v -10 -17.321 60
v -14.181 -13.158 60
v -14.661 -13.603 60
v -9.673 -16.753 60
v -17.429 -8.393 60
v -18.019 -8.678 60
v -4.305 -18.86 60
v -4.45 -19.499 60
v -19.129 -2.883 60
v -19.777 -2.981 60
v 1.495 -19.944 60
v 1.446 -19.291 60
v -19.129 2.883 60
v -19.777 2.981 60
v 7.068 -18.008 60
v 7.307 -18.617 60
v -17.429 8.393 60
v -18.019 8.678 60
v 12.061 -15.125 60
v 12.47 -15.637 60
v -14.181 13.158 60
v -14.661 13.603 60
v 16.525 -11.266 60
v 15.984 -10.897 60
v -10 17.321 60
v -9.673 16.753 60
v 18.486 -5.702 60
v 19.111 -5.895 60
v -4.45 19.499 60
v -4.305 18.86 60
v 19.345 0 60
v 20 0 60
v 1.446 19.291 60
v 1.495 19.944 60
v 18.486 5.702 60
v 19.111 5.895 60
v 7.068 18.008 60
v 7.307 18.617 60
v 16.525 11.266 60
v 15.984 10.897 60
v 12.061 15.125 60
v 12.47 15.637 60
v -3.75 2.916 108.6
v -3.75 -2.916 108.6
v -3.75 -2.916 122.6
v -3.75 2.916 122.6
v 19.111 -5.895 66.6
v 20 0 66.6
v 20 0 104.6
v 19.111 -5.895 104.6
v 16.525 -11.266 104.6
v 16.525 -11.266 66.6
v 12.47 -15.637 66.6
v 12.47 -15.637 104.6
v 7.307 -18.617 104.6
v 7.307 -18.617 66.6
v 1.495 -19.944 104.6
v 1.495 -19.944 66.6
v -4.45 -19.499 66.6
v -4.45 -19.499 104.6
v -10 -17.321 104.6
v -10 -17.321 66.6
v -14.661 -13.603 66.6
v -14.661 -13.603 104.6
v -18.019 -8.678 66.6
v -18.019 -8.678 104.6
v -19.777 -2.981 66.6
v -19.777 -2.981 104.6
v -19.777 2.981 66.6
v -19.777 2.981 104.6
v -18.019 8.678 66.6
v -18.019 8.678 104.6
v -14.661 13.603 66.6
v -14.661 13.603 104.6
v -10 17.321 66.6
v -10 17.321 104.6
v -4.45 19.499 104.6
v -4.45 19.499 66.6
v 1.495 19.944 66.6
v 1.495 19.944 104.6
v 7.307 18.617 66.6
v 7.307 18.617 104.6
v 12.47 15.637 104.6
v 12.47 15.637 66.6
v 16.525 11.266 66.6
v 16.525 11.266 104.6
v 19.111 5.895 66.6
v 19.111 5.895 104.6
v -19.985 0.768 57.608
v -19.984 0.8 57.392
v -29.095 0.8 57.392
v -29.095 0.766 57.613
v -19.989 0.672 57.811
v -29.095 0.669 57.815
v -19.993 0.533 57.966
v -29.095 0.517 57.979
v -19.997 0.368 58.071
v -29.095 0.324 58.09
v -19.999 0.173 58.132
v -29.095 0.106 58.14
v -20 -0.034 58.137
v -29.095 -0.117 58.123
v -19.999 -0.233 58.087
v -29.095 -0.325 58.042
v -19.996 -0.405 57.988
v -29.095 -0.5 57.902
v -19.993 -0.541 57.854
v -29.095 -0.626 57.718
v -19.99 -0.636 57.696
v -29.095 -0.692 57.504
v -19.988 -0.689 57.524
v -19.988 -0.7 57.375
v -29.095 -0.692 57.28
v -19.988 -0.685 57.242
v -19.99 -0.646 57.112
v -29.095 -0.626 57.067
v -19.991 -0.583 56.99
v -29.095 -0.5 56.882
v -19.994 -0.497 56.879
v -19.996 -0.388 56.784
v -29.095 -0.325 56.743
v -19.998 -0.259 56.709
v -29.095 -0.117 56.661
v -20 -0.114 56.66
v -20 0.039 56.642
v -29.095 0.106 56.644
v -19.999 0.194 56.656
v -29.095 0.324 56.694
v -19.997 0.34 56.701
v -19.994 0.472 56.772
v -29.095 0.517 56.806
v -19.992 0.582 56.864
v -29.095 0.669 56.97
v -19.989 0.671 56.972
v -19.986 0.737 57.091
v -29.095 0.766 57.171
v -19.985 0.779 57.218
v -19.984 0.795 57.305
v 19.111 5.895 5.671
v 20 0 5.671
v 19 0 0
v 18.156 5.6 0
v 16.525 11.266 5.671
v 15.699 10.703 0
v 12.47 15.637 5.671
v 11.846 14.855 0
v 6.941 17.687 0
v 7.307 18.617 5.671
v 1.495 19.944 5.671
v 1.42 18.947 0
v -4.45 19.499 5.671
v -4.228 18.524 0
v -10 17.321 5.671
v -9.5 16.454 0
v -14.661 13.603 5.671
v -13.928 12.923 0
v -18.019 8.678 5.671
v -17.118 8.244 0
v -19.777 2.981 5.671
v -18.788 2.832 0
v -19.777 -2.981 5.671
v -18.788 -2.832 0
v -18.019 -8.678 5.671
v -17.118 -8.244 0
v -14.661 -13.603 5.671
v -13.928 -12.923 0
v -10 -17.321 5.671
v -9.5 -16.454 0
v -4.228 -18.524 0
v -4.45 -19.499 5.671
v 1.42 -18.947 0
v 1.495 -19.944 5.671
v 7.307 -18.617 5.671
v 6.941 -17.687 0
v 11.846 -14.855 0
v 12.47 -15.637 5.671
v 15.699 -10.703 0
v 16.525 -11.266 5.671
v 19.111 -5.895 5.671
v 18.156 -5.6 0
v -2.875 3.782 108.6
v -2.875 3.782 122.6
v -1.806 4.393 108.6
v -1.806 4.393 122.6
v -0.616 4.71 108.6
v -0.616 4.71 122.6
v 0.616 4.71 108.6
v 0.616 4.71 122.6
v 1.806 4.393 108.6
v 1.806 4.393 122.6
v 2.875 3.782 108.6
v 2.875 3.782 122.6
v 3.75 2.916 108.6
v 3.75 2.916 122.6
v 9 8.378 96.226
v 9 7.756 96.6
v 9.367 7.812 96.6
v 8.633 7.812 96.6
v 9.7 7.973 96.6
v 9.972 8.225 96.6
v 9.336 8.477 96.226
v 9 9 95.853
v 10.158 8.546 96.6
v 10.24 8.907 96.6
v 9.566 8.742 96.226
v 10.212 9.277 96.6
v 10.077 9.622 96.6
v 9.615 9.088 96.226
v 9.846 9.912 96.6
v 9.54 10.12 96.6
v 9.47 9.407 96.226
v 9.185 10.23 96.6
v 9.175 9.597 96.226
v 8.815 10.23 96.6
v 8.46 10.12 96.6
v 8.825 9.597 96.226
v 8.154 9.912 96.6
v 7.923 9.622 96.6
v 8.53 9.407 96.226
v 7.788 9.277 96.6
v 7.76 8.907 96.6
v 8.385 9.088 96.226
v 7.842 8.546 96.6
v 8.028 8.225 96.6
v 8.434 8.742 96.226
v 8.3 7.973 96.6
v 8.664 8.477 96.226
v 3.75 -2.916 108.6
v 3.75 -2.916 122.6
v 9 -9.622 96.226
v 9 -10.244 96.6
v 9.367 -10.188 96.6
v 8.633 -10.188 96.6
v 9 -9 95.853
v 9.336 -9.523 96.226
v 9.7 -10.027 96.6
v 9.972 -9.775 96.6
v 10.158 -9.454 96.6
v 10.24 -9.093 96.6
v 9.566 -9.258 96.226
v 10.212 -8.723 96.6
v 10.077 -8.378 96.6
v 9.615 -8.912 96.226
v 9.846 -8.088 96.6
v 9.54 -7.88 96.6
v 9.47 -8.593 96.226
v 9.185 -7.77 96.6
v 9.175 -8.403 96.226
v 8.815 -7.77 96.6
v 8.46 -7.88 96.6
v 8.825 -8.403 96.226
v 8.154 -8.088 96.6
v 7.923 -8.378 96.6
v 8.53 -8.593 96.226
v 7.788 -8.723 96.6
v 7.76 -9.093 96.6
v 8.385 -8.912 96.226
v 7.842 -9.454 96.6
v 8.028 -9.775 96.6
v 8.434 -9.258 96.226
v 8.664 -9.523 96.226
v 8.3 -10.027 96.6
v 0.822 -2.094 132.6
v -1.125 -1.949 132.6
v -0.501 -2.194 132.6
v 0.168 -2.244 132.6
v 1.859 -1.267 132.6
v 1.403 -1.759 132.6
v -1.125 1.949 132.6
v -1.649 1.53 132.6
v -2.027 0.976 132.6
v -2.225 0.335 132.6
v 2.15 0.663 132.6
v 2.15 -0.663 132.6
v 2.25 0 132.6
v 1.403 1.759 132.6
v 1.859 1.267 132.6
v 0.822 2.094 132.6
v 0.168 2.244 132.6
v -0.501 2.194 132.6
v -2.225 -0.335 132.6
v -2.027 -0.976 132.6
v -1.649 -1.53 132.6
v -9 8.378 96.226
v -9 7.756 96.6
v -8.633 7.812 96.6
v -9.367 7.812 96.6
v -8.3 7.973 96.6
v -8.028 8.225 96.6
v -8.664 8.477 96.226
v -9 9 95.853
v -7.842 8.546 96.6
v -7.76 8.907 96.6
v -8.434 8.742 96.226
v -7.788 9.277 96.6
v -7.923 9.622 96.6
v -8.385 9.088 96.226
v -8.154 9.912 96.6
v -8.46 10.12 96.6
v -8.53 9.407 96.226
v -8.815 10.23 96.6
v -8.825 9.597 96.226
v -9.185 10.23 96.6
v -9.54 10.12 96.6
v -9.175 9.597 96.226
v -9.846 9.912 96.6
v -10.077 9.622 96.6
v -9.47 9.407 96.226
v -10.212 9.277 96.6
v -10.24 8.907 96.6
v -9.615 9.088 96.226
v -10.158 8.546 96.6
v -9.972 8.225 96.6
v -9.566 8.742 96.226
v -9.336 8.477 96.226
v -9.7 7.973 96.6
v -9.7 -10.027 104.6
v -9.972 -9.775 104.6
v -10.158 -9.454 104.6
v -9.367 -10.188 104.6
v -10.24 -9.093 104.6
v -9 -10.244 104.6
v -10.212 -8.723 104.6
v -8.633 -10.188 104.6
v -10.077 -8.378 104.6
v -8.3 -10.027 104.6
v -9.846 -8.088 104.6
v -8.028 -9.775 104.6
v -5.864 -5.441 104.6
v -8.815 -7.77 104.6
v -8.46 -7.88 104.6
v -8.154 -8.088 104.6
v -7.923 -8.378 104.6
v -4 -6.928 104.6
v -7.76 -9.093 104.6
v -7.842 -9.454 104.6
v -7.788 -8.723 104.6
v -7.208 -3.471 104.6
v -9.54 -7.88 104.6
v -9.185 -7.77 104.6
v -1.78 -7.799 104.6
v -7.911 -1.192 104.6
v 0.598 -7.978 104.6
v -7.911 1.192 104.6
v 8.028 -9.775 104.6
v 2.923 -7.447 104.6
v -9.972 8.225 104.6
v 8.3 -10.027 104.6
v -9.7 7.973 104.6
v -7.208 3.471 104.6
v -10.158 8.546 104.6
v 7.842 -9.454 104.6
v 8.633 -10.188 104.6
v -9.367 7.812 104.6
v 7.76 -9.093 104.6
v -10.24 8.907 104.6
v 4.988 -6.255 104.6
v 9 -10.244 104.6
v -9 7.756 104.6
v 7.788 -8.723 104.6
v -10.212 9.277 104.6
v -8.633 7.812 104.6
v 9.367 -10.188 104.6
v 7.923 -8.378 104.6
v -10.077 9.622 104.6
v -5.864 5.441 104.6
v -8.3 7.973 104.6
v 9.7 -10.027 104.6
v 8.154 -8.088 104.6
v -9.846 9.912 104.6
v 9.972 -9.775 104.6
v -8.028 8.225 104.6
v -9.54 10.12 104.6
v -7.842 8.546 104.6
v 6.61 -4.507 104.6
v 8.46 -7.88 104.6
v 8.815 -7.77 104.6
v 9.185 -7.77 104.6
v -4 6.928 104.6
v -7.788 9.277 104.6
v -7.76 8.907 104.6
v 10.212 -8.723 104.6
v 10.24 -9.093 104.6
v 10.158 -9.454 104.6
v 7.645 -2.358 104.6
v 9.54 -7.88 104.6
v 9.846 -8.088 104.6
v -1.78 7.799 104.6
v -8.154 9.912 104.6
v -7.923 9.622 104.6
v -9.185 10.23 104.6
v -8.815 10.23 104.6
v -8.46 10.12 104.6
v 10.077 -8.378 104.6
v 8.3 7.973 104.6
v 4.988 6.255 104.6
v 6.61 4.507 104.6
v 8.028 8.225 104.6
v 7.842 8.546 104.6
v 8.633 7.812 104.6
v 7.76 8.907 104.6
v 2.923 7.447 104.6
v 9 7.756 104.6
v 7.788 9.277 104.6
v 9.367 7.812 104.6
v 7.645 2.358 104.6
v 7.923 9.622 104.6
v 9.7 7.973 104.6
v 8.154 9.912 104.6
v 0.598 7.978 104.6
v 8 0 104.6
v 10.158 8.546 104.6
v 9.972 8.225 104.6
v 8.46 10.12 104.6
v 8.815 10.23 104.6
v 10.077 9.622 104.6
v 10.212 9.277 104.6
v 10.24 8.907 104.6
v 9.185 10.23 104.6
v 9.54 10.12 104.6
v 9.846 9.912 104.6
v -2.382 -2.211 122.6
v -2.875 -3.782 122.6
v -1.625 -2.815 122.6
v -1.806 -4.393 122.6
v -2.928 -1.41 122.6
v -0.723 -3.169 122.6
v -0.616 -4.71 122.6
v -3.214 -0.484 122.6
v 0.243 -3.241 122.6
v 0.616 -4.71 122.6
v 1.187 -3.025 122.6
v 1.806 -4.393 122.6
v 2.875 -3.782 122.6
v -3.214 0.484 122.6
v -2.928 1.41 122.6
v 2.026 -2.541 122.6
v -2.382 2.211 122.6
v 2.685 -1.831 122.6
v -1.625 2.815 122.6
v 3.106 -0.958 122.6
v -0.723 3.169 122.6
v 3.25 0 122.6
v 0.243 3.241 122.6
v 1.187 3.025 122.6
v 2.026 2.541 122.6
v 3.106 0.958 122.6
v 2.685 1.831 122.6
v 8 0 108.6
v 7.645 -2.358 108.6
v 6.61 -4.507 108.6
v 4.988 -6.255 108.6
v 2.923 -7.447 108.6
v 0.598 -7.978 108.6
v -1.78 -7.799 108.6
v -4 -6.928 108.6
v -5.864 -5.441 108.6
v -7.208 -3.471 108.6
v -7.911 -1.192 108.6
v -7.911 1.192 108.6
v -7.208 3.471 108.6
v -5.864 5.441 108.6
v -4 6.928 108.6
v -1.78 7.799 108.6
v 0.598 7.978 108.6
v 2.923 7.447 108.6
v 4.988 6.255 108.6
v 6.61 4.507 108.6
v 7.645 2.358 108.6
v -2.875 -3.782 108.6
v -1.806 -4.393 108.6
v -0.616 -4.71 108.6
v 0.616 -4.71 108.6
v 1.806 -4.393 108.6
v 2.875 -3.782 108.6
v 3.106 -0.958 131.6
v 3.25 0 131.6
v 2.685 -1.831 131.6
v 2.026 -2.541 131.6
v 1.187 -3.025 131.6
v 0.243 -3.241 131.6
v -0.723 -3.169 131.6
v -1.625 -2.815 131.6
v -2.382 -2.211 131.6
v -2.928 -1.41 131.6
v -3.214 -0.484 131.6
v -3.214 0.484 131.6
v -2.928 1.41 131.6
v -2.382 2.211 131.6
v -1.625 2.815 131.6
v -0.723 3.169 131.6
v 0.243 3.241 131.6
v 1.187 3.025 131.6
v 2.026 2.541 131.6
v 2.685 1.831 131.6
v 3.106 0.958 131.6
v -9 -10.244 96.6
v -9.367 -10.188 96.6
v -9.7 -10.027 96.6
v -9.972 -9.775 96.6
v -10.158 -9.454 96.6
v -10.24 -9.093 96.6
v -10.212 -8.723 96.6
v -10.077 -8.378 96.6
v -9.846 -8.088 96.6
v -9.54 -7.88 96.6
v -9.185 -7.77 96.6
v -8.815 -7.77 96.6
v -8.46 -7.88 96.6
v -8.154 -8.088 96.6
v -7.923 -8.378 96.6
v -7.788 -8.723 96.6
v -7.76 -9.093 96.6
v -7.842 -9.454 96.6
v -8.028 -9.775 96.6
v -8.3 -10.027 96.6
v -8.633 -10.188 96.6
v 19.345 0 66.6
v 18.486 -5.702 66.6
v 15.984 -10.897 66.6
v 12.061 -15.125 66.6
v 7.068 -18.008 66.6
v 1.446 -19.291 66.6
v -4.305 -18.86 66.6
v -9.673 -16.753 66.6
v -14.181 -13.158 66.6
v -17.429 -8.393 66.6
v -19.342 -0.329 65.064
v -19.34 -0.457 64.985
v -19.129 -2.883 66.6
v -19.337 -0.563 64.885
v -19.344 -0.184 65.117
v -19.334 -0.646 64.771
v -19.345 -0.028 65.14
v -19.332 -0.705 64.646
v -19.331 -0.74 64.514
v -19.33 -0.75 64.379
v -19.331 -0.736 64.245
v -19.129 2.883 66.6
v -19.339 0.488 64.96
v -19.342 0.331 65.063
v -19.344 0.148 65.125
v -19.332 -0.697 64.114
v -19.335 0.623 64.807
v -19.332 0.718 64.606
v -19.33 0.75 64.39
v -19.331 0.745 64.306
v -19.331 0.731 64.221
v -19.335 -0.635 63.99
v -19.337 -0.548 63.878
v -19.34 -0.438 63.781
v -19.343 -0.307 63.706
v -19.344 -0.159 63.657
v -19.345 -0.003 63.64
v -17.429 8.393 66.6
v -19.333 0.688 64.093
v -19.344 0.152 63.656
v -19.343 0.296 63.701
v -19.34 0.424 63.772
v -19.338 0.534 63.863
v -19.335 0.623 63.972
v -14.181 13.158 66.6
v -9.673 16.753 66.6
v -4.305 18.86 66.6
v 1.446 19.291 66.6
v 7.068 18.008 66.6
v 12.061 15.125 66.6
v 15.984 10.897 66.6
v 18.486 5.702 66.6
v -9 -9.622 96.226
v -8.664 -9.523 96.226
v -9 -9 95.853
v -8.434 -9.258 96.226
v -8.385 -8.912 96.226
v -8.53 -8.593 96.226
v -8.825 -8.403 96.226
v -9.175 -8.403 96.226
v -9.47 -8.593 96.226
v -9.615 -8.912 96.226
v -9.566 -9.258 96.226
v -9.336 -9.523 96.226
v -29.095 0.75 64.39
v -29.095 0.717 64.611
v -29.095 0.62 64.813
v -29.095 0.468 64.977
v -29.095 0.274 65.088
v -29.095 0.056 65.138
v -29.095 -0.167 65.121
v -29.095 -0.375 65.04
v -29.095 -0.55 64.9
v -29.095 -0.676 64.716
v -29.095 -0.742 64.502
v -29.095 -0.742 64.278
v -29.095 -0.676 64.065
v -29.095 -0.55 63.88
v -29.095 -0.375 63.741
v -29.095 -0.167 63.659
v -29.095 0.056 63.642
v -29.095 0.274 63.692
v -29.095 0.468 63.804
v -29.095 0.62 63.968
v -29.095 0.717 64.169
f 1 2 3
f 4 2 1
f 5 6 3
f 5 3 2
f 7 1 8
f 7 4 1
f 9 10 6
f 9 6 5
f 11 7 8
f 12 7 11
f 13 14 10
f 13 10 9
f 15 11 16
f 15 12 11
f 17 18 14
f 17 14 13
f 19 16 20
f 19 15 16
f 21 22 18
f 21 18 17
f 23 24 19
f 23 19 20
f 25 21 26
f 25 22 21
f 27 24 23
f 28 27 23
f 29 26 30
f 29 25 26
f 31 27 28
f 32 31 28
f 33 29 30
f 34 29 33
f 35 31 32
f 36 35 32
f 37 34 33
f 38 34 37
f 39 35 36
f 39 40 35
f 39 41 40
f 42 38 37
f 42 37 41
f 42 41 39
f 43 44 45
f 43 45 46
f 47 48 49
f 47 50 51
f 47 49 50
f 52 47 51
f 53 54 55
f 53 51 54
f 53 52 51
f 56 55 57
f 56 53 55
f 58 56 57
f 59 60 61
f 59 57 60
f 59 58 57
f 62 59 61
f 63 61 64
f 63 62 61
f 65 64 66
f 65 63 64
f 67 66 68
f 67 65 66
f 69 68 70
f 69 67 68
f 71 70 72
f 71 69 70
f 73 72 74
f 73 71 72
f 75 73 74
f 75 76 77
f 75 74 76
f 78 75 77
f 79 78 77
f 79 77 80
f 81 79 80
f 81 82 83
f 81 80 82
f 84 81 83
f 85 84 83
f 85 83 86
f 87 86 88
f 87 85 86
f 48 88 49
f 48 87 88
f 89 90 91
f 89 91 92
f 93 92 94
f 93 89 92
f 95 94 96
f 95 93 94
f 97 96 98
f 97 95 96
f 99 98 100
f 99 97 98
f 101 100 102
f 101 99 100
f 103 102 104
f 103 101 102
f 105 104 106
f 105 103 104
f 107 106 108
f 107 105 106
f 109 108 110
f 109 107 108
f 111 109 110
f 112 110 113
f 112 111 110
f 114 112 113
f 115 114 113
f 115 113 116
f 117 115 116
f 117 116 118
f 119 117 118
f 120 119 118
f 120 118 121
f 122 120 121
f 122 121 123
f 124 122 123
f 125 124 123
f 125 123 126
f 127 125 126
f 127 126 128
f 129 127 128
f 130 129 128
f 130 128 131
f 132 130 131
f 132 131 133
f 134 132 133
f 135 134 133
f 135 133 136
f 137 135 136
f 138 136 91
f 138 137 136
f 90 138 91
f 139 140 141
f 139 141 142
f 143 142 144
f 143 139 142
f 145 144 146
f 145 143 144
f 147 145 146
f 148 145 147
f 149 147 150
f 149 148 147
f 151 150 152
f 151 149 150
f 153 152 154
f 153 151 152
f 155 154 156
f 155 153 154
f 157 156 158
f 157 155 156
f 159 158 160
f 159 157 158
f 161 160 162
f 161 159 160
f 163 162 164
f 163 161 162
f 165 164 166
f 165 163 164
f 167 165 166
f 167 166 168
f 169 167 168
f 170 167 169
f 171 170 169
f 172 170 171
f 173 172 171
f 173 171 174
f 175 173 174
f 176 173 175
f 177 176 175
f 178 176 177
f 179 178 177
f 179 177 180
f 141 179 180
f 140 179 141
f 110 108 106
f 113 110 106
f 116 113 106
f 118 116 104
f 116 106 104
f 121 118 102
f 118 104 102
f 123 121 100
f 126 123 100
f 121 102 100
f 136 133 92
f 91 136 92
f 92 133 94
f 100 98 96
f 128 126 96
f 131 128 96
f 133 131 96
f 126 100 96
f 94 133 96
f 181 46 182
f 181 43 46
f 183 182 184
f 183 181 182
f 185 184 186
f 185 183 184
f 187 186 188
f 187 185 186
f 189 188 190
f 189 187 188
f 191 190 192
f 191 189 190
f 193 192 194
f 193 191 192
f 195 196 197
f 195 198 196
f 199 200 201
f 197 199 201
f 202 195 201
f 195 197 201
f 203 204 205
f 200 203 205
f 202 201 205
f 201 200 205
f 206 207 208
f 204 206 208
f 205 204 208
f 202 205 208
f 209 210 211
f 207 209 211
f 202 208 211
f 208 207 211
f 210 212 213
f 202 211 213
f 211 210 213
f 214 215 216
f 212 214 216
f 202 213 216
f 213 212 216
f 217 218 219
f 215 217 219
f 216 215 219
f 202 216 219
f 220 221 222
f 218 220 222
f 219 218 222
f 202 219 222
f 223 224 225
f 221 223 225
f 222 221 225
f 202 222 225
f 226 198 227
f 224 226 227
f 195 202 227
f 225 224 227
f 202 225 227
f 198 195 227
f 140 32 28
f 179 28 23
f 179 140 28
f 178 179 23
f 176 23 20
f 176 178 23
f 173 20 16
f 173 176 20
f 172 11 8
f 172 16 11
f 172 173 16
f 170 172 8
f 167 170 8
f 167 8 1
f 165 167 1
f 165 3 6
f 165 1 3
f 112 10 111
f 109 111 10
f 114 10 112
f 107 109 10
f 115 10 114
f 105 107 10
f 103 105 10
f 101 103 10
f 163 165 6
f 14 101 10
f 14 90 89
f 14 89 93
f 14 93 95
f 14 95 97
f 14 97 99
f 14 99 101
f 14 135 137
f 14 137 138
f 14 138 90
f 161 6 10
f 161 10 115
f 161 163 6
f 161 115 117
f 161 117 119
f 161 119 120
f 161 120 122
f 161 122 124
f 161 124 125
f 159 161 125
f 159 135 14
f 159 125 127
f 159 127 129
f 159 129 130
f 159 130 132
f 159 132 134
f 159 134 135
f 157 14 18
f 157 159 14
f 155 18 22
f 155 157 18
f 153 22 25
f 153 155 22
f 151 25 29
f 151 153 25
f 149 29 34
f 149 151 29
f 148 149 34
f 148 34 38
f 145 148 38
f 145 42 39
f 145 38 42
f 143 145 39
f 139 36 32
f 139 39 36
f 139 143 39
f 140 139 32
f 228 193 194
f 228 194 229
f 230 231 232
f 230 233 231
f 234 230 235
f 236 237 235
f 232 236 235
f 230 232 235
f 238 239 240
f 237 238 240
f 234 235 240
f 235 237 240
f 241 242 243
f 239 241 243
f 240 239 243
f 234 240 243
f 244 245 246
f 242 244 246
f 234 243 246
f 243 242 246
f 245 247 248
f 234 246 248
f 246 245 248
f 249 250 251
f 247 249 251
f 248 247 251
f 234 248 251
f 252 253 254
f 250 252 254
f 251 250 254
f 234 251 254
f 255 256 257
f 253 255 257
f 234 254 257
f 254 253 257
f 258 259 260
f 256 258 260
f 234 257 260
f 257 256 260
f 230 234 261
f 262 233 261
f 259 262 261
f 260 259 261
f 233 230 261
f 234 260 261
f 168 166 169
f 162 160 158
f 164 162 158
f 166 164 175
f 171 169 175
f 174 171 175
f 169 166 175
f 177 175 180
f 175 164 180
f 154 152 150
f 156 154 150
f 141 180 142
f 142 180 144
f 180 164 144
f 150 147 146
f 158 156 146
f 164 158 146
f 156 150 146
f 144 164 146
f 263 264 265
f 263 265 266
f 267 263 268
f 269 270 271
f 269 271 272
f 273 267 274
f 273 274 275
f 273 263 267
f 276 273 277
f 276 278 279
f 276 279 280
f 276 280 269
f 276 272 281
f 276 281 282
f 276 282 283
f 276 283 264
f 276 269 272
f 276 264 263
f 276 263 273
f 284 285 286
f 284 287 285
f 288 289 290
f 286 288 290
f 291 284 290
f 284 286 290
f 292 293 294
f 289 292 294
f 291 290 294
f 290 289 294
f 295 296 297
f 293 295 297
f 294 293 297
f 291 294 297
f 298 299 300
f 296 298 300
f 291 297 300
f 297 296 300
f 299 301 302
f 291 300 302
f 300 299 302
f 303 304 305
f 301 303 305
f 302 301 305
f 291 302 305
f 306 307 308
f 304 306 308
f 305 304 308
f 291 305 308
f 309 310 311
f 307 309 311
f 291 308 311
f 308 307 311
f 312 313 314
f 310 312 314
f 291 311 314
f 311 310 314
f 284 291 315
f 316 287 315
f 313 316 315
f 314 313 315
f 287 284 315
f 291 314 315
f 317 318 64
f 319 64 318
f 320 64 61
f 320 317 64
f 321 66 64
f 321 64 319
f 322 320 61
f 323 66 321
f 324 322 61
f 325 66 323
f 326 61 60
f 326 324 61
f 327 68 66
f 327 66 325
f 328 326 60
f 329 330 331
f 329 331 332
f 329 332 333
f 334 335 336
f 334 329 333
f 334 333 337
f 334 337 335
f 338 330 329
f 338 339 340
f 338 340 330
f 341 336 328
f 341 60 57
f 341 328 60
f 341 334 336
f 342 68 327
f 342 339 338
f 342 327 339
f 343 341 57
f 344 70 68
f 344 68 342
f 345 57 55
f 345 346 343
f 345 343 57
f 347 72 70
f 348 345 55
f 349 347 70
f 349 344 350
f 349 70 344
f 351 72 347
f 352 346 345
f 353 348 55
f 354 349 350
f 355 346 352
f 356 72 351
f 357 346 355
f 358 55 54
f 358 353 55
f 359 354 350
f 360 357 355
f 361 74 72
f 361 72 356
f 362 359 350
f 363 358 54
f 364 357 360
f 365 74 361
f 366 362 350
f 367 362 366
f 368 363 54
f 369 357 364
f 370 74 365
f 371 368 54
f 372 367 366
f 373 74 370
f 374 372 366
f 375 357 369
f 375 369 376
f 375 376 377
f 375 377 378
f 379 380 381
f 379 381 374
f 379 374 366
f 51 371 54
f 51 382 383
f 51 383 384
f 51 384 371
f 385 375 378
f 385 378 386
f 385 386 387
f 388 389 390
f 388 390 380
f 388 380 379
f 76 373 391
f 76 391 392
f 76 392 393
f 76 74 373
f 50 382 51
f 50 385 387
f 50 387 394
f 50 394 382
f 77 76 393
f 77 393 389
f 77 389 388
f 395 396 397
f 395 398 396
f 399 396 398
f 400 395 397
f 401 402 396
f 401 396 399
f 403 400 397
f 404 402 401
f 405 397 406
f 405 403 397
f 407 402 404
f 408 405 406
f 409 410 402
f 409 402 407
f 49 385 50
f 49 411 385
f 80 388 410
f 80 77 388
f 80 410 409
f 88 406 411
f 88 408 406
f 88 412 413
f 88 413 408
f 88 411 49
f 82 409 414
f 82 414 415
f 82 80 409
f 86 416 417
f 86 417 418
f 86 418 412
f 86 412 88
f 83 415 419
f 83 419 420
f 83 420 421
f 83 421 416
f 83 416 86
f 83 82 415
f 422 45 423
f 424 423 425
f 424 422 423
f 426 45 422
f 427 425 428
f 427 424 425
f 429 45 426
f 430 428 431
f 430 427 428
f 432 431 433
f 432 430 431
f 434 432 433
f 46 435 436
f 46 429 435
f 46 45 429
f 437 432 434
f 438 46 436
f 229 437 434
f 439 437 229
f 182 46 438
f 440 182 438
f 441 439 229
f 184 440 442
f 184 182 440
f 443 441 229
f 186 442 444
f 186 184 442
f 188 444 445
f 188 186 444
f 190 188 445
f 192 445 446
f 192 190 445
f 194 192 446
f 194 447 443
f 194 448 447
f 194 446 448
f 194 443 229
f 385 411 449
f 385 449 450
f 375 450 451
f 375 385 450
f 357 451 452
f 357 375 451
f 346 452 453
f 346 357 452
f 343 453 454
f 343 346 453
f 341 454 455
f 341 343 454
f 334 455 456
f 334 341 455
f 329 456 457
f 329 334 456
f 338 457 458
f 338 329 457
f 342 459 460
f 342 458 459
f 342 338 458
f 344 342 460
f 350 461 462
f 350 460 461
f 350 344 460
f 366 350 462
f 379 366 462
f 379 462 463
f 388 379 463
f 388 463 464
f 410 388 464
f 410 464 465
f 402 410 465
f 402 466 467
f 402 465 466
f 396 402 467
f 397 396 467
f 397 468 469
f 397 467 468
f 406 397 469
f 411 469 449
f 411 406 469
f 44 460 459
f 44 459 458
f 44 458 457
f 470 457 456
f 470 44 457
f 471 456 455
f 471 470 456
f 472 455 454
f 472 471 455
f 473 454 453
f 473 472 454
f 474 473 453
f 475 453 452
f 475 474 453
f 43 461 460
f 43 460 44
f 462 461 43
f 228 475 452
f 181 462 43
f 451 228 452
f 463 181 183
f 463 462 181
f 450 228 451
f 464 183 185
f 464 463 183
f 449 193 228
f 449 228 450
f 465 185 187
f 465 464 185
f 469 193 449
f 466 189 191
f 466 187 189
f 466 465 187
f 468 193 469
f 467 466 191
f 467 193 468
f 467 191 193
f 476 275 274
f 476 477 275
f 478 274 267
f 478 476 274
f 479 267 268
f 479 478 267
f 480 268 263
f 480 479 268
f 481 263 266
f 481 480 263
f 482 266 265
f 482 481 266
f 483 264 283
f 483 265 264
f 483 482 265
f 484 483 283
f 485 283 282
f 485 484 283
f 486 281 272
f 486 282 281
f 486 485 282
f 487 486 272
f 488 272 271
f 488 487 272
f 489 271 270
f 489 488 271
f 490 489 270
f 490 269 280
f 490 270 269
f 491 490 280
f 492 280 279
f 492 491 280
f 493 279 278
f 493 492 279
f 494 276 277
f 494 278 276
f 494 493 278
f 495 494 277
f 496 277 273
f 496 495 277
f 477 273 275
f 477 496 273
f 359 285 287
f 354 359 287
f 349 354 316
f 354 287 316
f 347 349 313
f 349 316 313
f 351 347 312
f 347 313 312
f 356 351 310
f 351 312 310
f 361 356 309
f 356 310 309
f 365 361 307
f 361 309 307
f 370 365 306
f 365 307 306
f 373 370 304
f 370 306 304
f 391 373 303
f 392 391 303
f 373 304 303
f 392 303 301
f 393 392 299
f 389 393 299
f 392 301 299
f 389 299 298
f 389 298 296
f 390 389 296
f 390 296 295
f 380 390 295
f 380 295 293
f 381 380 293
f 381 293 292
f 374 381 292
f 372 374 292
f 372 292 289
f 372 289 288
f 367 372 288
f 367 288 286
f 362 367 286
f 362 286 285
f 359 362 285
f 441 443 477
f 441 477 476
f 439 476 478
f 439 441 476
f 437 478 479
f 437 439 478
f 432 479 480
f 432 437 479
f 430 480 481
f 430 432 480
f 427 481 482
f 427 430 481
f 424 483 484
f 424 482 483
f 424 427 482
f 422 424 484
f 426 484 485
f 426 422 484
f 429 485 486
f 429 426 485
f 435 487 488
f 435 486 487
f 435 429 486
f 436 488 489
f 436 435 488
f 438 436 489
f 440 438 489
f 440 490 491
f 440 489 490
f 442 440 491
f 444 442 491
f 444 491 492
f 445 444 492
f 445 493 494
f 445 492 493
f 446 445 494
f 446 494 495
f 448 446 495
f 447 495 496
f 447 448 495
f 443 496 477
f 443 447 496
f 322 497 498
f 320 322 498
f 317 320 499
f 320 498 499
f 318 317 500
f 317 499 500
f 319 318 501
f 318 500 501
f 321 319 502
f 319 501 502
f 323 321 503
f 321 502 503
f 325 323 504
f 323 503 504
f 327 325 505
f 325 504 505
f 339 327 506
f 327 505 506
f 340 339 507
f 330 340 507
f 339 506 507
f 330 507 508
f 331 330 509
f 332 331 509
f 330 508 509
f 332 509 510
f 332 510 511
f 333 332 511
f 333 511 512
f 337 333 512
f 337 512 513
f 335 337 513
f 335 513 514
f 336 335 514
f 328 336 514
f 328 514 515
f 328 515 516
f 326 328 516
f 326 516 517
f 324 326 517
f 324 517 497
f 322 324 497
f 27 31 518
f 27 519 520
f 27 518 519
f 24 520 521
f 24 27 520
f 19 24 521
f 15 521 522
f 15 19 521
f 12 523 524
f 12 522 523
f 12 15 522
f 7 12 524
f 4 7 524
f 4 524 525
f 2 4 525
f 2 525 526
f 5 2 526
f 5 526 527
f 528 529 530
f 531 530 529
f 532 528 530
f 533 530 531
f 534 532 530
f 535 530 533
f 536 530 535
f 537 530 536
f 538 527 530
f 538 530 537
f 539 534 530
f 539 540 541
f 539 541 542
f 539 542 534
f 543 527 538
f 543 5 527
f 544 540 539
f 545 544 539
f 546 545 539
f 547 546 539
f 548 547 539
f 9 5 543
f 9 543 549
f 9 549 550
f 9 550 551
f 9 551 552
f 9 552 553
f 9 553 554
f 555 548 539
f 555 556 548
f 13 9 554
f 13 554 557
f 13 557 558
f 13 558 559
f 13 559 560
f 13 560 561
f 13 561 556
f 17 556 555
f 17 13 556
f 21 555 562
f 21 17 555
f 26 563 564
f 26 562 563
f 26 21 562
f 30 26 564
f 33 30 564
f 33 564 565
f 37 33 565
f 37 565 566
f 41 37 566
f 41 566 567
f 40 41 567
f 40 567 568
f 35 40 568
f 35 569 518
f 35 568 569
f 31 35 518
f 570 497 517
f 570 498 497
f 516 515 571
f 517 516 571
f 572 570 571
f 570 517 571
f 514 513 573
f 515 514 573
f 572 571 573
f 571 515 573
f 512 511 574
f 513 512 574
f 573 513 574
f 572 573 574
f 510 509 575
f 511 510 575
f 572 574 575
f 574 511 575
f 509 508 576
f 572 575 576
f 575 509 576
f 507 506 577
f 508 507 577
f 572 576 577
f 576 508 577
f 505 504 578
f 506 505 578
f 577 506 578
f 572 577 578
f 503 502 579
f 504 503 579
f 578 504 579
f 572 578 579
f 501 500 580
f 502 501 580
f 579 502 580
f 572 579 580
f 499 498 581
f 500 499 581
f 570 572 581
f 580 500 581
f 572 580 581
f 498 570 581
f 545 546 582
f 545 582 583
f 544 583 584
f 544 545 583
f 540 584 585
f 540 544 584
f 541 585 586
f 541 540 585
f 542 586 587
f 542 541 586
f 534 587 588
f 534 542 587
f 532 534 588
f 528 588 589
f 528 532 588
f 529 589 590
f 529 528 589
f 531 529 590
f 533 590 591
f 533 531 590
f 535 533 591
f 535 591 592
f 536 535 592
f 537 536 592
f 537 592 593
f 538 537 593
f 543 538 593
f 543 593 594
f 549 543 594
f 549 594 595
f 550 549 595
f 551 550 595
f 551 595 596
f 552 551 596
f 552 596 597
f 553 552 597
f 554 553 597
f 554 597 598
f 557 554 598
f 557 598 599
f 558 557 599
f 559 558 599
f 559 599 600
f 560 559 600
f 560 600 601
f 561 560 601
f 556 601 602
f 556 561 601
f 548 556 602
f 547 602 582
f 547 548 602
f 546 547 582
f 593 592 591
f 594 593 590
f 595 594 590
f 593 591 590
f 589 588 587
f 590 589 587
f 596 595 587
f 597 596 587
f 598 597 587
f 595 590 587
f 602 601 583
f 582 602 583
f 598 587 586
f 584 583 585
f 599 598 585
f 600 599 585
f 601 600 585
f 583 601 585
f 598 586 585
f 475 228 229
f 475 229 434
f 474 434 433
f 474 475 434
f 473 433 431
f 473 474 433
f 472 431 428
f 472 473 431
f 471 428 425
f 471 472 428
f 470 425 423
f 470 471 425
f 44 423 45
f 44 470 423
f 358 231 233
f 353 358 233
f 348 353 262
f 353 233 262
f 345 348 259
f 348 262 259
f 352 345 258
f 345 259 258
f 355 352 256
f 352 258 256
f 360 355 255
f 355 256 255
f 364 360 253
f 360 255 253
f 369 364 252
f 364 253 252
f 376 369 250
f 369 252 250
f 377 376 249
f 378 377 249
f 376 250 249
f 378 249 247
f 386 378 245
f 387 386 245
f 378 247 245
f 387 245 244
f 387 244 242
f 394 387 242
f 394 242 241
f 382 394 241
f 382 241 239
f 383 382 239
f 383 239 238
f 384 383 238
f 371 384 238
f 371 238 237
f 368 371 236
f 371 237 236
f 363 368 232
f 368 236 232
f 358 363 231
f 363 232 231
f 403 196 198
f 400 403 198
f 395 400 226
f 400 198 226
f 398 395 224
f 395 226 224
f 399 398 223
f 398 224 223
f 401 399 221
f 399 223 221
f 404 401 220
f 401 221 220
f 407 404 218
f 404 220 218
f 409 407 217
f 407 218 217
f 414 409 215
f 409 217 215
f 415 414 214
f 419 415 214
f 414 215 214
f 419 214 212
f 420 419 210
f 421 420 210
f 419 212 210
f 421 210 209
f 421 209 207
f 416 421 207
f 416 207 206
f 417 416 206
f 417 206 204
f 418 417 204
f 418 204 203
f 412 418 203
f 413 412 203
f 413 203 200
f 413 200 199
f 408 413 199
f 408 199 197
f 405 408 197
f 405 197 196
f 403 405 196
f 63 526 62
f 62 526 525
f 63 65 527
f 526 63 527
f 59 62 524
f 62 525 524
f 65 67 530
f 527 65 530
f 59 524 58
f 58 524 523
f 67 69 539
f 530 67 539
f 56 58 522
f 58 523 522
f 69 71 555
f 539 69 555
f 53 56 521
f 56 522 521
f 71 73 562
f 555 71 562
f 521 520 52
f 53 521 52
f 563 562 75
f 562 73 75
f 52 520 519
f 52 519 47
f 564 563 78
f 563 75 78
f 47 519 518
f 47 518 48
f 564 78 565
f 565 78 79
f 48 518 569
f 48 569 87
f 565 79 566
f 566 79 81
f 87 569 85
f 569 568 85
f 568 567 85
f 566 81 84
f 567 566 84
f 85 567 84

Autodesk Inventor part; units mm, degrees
ref_plane "YZ Plane" through (0, 0, 0) normal (1, 0, 0) x (0, 1, 0)
sketch "Sketch1" plane through (0, 0, 0) normal (0, 0, 1) x (1, 0, 0)
  circle A0 centre (0, 0) radius 20
  dimension "d0" = 40
extrude "Extrusion1" add sketch "Sketch1" along normal blind 60
sketch "Sketch2" plane through (0, 0, 60) normal (0, 0, 1) x (1, 0, 0)
  circle A0 centre (0, 0) radius 20 projected
  circle A1 centre (0, 0) radius 19.345
extrude "Extrusion2" add sketch "Sketch2" along normal blind 6.6 contours A1
sketch "Sketch3" plane through (0, 0, 66.6) normal (0, 0, 1) x (1, 0, 0)
  circle A0 centre (0, 0) radius 19.345 projected
  circle A1 centre (0, 0) radius 20
  dimension "d5" = 40
extrude "Extrusion3" add sketch "Sketch3" along normal blind 38 contours A0 | A1
sketch "Sketch4" plane through (0, 0, 104.6) normal (0, 0, 1) x (1, 0, 0)
  circle A0 centre (0, 0) radius 20 projected
  circle A1 centre (0, 0) radius 8
  dimension "d8" = 16
extrude "Extrusion4" add sketch "Sketch4" along normal blind 4 contours A1
sketch "Sketch5" plane through (0, 0, 108.6) normal (0, 0, 1) x (1, 0, 0)
  circle A0 centre (0, 0) radius 8 projected
  line L0 (3.75, 2.9155) -> (3.75, -2.9155)
  line L1 (-3.75, -2.9155) -> (-3.75, 2.9155)
  arc A1 (-3.75, -2.9155) -> (3.75, -2.9155) centre (0, 0) ccw
  arc A2 (3.75, 2.9155) -> (-3.75, 2.9155) centre (0, 0) ccw
  point P0 (-3.75, 0)
  point P1 (0, 5.9024)
  dimension "d13" = 4.75
  dimension "d14" = 4.75
  dimension "d15" = 7.5
  dimension "d16" = 3.75
  dimension "d17" = 7.5
  dimension "d18" = 5.9024
extrude "Extrusion5" add sketch "Sketch5" along normal blind 14 contours L0 A1 L1 A2
sketch "Sketch6" plane through (0, 0, 122.6) normal (0, 0, 1) x (1, 0, 0)
  line L0 (3.75, 2.9155) -> (3.75, -2.9155) projected
  arc A0 (3.75, 2.9155) -> (-3.75, 2.9155) centre (0, 0) ccw projected
  line L1 (-3.75, -2.9155) -> (-3.75, 2.9155) projected
  arc A1 (-3.75, -2.9155) -> (3.75, -2.9155) centre (0, 0) ccw projected
  circle A2 centre (0, 0) radius 3.25
  dimension "d21" = 6.5
extrude "Extrusion6" add sketch "Sketch6" along normal blind 10 contours A2
chamfer "Chamfer1" distance 1 angle 45 1 edges at (-3.25, 0, 132.6)
chamfer "Chamfer2" distance 1 angle 80 1 edges at (-20, 0, 0) measured on face at (-2.364, 6.2334, 0)
ref_plane "Work Plane1" through (-19.345, 0, 60) normal (1, 0, 0) x (0, 1, 0)
ref_plane "Work Plane2" through (-19.095, 0, 60) normal (1, 0, 0) x (0, 1, 0)
sketch "Sketch8" plane through (-19.095, 0, 60) normal (1, 0, 0) x (0, 1, 0)
  circle A0 centre (0.0498, -2.6078) radius 0.75
  circle A1 centre (0, 4.3902) radius 0.75
  dimension "d31" = 1.5
  dimension "d32" = 1.5
extrude "Extrusion7" add sketch "Sketch8" against normal blind 10
sketch "Sketch9" plane through (0, 0, 104.6) normal (0, 0, 1) x (1, 0, 0)
  circle A0 centre (0, 0) radius 8 projected
  circle A1 centre (0, 0) radius 20 projected
  line L0 (-9, 9) -> (9, 9)
  line L1 (9, 9) -> (9, -9)
  line L2 (9, -9) -> (-9, -9)
  line L3 (-9, -9) -> (-9, 9)
  point P0 (0, 9)
  point P1 (-9, 0)
  dimension "d35" = 18
  dimension "d36" = 18
hole "Hole1" at (-9, 9, 104.6) at (9, 9, 104.6) at (9, -9, 104.6) at (-9, -9, 104.6) direction (0, 0, -1) diameter 2.487 depth 8 tip angle 118 thread size "5-40 UNC" class "2B" standard "ANSI Unified Screw Threads"
equation "\"d32\" = d31"
equation "\"d36\" = d35"
properties part number "409A587"
